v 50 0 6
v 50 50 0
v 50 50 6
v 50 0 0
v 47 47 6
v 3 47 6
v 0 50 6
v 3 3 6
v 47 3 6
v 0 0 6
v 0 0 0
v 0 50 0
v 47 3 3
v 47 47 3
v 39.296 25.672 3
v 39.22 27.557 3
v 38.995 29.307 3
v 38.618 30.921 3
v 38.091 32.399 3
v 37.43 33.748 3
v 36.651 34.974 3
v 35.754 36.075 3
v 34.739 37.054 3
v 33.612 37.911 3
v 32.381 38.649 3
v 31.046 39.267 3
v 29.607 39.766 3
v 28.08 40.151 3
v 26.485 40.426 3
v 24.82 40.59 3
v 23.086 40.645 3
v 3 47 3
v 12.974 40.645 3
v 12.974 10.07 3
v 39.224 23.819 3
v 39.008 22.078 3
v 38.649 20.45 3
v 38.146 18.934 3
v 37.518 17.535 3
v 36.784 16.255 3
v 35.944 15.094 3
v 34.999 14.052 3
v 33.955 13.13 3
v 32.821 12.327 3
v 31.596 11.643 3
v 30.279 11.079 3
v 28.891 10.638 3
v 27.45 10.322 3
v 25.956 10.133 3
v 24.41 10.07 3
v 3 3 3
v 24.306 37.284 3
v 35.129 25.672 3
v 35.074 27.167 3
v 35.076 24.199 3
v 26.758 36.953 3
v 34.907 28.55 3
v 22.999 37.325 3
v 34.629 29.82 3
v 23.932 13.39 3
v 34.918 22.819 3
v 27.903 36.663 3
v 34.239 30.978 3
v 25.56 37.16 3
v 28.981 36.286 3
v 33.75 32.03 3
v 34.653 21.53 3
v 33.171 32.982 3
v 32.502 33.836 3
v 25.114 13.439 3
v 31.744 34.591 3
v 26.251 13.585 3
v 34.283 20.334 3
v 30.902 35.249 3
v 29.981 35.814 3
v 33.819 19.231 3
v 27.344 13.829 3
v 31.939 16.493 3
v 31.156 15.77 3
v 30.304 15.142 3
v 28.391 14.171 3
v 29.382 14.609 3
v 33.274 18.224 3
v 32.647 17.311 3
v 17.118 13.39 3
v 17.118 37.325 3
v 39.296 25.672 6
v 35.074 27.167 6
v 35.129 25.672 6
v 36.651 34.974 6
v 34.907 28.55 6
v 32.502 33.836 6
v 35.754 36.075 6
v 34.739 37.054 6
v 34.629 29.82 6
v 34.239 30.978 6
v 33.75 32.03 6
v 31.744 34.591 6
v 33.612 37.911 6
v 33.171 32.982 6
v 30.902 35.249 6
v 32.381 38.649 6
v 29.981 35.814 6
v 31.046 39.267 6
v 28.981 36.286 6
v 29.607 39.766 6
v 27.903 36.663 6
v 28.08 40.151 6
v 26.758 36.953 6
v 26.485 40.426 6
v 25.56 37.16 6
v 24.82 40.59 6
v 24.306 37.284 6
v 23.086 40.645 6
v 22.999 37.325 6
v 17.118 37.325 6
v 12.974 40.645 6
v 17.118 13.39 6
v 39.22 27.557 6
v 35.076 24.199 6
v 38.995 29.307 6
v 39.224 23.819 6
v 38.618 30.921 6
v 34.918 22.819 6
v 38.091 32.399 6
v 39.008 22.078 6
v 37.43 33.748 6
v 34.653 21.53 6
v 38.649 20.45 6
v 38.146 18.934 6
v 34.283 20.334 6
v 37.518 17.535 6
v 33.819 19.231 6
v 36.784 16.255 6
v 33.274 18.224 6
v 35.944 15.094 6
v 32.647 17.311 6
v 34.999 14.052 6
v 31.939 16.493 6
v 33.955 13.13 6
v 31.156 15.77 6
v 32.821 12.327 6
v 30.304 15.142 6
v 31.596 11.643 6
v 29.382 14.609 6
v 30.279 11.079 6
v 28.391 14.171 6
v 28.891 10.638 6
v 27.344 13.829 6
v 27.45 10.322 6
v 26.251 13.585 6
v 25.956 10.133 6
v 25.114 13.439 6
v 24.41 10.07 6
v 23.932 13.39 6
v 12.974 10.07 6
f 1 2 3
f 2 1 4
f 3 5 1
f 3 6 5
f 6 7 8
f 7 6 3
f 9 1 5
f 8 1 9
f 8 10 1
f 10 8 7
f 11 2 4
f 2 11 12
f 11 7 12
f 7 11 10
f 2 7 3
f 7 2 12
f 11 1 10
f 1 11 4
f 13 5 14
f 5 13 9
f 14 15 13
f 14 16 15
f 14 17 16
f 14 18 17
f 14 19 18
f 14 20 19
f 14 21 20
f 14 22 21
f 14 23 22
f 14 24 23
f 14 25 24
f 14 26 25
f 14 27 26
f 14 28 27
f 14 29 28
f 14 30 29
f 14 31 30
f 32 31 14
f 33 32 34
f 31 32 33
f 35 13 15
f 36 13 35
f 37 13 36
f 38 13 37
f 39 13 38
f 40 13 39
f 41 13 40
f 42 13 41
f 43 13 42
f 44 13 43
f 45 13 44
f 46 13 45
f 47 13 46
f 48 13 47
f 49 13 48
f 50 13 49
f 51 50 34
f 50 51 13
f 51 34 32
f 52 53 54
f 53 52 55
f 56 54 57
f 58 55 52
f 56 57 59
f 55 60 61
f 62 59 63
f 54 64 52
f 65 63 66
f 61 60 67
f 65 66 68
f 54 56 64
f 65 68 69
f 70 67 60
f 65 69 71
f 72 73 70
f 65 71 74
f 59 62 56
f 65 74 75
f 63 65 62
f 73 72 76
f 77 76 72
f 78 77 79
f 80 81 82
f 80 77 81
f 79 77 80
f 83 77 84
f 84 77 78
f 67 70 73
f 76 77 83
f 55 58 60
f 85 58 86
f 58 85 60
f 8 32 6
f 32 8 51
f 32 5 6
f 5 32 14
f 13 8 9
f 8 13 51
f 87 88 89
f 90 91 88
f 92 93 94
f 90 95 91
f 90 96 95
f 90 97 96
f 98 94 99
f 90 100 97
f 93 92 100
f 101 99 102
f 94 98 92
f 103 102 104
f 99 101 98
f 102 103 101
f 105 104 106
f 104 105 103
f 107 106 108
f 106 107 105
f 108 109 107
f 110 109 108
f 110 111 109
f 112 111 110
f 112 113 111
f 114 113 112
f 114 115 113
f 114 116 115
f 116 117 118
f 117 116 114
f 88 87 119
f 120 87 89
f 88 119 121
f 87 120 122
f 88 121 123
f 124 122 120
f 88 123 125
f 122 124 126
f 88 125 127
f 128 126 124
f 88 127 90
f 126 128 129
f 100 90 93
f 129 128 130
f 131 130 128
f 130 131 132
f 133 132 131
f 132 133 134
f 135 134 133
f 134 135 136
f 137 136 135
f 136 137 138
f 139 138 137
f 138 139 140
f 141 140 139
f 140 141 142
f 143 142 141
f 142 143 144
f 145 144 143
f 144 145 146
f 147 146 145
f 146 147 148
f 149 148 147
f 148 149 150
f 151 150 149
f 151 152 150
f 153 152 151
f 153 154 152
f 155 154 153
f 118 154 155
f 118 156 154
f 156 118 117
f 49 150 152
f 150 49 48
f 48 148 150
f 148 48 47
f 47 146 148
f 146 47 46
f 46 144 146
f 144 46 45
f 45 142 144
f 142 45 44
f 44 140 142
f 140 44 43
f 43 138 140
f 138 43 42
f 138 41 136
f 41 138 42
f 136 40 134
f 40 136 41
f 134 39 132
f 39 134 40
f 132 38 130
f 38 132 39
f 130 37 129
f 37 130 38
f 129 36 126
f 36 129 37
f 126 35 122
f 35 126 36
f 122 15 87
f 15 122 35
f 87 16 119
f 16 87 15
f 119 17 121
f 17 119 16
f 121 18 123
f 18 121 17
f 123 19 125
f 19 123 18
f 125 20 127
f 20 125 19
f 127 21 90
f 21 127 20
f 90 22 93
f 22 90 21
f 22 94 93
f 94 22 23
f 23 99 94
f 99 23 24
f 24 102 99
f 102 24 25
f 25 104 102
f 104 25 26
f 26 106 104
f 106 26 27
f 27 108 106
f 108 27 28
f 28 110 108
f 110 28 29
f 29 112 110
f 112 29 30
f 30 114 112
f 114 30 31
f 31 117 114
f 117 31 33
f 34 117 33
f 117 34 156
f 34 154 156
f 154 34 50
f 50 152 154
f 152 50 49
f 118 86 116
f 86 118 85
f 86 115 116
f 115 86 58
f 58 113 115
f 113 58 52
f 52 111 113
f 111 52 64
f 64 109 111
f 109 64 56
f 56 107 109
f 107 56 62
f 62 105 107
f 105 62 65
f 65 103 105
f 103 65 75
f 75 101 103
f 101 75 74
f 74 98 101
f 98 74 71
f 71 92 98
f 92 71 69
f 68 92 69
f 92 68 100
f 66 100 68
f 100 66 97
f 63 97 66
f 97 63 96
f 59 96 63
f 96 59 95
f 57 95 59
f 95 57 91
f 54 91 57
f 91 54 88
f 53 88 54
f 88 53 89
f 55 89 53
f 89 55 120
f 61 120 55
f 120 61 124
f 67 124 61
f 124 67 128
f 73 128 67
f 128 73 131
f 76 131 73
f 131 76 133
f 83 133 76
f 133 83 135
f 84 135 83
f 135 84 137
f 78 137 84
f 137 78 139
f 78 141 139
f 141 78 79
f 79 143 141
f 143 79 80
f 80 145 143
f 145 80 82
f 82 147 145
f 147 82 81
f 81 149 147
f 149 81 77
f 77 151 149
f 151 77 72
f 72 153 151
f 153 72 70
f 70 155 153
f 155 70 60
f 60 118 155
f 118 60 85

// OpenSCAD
character = "8";
font_size = 32;
square_size = 50;
border = 3;
height = 6;
profile = 3;
o = square_size / 2;

module letter(ch) {
linear_extrude(height)
    text(ch, font_size, halign="center", valign="center");
}
translate([o, o, 0])
letter("D");
difference() {
    cube([square_size,square_size,height]);
        translate([border,border,profile])
    cube([square_size - border * 2,square_size-border*2,profile*2]);
}
